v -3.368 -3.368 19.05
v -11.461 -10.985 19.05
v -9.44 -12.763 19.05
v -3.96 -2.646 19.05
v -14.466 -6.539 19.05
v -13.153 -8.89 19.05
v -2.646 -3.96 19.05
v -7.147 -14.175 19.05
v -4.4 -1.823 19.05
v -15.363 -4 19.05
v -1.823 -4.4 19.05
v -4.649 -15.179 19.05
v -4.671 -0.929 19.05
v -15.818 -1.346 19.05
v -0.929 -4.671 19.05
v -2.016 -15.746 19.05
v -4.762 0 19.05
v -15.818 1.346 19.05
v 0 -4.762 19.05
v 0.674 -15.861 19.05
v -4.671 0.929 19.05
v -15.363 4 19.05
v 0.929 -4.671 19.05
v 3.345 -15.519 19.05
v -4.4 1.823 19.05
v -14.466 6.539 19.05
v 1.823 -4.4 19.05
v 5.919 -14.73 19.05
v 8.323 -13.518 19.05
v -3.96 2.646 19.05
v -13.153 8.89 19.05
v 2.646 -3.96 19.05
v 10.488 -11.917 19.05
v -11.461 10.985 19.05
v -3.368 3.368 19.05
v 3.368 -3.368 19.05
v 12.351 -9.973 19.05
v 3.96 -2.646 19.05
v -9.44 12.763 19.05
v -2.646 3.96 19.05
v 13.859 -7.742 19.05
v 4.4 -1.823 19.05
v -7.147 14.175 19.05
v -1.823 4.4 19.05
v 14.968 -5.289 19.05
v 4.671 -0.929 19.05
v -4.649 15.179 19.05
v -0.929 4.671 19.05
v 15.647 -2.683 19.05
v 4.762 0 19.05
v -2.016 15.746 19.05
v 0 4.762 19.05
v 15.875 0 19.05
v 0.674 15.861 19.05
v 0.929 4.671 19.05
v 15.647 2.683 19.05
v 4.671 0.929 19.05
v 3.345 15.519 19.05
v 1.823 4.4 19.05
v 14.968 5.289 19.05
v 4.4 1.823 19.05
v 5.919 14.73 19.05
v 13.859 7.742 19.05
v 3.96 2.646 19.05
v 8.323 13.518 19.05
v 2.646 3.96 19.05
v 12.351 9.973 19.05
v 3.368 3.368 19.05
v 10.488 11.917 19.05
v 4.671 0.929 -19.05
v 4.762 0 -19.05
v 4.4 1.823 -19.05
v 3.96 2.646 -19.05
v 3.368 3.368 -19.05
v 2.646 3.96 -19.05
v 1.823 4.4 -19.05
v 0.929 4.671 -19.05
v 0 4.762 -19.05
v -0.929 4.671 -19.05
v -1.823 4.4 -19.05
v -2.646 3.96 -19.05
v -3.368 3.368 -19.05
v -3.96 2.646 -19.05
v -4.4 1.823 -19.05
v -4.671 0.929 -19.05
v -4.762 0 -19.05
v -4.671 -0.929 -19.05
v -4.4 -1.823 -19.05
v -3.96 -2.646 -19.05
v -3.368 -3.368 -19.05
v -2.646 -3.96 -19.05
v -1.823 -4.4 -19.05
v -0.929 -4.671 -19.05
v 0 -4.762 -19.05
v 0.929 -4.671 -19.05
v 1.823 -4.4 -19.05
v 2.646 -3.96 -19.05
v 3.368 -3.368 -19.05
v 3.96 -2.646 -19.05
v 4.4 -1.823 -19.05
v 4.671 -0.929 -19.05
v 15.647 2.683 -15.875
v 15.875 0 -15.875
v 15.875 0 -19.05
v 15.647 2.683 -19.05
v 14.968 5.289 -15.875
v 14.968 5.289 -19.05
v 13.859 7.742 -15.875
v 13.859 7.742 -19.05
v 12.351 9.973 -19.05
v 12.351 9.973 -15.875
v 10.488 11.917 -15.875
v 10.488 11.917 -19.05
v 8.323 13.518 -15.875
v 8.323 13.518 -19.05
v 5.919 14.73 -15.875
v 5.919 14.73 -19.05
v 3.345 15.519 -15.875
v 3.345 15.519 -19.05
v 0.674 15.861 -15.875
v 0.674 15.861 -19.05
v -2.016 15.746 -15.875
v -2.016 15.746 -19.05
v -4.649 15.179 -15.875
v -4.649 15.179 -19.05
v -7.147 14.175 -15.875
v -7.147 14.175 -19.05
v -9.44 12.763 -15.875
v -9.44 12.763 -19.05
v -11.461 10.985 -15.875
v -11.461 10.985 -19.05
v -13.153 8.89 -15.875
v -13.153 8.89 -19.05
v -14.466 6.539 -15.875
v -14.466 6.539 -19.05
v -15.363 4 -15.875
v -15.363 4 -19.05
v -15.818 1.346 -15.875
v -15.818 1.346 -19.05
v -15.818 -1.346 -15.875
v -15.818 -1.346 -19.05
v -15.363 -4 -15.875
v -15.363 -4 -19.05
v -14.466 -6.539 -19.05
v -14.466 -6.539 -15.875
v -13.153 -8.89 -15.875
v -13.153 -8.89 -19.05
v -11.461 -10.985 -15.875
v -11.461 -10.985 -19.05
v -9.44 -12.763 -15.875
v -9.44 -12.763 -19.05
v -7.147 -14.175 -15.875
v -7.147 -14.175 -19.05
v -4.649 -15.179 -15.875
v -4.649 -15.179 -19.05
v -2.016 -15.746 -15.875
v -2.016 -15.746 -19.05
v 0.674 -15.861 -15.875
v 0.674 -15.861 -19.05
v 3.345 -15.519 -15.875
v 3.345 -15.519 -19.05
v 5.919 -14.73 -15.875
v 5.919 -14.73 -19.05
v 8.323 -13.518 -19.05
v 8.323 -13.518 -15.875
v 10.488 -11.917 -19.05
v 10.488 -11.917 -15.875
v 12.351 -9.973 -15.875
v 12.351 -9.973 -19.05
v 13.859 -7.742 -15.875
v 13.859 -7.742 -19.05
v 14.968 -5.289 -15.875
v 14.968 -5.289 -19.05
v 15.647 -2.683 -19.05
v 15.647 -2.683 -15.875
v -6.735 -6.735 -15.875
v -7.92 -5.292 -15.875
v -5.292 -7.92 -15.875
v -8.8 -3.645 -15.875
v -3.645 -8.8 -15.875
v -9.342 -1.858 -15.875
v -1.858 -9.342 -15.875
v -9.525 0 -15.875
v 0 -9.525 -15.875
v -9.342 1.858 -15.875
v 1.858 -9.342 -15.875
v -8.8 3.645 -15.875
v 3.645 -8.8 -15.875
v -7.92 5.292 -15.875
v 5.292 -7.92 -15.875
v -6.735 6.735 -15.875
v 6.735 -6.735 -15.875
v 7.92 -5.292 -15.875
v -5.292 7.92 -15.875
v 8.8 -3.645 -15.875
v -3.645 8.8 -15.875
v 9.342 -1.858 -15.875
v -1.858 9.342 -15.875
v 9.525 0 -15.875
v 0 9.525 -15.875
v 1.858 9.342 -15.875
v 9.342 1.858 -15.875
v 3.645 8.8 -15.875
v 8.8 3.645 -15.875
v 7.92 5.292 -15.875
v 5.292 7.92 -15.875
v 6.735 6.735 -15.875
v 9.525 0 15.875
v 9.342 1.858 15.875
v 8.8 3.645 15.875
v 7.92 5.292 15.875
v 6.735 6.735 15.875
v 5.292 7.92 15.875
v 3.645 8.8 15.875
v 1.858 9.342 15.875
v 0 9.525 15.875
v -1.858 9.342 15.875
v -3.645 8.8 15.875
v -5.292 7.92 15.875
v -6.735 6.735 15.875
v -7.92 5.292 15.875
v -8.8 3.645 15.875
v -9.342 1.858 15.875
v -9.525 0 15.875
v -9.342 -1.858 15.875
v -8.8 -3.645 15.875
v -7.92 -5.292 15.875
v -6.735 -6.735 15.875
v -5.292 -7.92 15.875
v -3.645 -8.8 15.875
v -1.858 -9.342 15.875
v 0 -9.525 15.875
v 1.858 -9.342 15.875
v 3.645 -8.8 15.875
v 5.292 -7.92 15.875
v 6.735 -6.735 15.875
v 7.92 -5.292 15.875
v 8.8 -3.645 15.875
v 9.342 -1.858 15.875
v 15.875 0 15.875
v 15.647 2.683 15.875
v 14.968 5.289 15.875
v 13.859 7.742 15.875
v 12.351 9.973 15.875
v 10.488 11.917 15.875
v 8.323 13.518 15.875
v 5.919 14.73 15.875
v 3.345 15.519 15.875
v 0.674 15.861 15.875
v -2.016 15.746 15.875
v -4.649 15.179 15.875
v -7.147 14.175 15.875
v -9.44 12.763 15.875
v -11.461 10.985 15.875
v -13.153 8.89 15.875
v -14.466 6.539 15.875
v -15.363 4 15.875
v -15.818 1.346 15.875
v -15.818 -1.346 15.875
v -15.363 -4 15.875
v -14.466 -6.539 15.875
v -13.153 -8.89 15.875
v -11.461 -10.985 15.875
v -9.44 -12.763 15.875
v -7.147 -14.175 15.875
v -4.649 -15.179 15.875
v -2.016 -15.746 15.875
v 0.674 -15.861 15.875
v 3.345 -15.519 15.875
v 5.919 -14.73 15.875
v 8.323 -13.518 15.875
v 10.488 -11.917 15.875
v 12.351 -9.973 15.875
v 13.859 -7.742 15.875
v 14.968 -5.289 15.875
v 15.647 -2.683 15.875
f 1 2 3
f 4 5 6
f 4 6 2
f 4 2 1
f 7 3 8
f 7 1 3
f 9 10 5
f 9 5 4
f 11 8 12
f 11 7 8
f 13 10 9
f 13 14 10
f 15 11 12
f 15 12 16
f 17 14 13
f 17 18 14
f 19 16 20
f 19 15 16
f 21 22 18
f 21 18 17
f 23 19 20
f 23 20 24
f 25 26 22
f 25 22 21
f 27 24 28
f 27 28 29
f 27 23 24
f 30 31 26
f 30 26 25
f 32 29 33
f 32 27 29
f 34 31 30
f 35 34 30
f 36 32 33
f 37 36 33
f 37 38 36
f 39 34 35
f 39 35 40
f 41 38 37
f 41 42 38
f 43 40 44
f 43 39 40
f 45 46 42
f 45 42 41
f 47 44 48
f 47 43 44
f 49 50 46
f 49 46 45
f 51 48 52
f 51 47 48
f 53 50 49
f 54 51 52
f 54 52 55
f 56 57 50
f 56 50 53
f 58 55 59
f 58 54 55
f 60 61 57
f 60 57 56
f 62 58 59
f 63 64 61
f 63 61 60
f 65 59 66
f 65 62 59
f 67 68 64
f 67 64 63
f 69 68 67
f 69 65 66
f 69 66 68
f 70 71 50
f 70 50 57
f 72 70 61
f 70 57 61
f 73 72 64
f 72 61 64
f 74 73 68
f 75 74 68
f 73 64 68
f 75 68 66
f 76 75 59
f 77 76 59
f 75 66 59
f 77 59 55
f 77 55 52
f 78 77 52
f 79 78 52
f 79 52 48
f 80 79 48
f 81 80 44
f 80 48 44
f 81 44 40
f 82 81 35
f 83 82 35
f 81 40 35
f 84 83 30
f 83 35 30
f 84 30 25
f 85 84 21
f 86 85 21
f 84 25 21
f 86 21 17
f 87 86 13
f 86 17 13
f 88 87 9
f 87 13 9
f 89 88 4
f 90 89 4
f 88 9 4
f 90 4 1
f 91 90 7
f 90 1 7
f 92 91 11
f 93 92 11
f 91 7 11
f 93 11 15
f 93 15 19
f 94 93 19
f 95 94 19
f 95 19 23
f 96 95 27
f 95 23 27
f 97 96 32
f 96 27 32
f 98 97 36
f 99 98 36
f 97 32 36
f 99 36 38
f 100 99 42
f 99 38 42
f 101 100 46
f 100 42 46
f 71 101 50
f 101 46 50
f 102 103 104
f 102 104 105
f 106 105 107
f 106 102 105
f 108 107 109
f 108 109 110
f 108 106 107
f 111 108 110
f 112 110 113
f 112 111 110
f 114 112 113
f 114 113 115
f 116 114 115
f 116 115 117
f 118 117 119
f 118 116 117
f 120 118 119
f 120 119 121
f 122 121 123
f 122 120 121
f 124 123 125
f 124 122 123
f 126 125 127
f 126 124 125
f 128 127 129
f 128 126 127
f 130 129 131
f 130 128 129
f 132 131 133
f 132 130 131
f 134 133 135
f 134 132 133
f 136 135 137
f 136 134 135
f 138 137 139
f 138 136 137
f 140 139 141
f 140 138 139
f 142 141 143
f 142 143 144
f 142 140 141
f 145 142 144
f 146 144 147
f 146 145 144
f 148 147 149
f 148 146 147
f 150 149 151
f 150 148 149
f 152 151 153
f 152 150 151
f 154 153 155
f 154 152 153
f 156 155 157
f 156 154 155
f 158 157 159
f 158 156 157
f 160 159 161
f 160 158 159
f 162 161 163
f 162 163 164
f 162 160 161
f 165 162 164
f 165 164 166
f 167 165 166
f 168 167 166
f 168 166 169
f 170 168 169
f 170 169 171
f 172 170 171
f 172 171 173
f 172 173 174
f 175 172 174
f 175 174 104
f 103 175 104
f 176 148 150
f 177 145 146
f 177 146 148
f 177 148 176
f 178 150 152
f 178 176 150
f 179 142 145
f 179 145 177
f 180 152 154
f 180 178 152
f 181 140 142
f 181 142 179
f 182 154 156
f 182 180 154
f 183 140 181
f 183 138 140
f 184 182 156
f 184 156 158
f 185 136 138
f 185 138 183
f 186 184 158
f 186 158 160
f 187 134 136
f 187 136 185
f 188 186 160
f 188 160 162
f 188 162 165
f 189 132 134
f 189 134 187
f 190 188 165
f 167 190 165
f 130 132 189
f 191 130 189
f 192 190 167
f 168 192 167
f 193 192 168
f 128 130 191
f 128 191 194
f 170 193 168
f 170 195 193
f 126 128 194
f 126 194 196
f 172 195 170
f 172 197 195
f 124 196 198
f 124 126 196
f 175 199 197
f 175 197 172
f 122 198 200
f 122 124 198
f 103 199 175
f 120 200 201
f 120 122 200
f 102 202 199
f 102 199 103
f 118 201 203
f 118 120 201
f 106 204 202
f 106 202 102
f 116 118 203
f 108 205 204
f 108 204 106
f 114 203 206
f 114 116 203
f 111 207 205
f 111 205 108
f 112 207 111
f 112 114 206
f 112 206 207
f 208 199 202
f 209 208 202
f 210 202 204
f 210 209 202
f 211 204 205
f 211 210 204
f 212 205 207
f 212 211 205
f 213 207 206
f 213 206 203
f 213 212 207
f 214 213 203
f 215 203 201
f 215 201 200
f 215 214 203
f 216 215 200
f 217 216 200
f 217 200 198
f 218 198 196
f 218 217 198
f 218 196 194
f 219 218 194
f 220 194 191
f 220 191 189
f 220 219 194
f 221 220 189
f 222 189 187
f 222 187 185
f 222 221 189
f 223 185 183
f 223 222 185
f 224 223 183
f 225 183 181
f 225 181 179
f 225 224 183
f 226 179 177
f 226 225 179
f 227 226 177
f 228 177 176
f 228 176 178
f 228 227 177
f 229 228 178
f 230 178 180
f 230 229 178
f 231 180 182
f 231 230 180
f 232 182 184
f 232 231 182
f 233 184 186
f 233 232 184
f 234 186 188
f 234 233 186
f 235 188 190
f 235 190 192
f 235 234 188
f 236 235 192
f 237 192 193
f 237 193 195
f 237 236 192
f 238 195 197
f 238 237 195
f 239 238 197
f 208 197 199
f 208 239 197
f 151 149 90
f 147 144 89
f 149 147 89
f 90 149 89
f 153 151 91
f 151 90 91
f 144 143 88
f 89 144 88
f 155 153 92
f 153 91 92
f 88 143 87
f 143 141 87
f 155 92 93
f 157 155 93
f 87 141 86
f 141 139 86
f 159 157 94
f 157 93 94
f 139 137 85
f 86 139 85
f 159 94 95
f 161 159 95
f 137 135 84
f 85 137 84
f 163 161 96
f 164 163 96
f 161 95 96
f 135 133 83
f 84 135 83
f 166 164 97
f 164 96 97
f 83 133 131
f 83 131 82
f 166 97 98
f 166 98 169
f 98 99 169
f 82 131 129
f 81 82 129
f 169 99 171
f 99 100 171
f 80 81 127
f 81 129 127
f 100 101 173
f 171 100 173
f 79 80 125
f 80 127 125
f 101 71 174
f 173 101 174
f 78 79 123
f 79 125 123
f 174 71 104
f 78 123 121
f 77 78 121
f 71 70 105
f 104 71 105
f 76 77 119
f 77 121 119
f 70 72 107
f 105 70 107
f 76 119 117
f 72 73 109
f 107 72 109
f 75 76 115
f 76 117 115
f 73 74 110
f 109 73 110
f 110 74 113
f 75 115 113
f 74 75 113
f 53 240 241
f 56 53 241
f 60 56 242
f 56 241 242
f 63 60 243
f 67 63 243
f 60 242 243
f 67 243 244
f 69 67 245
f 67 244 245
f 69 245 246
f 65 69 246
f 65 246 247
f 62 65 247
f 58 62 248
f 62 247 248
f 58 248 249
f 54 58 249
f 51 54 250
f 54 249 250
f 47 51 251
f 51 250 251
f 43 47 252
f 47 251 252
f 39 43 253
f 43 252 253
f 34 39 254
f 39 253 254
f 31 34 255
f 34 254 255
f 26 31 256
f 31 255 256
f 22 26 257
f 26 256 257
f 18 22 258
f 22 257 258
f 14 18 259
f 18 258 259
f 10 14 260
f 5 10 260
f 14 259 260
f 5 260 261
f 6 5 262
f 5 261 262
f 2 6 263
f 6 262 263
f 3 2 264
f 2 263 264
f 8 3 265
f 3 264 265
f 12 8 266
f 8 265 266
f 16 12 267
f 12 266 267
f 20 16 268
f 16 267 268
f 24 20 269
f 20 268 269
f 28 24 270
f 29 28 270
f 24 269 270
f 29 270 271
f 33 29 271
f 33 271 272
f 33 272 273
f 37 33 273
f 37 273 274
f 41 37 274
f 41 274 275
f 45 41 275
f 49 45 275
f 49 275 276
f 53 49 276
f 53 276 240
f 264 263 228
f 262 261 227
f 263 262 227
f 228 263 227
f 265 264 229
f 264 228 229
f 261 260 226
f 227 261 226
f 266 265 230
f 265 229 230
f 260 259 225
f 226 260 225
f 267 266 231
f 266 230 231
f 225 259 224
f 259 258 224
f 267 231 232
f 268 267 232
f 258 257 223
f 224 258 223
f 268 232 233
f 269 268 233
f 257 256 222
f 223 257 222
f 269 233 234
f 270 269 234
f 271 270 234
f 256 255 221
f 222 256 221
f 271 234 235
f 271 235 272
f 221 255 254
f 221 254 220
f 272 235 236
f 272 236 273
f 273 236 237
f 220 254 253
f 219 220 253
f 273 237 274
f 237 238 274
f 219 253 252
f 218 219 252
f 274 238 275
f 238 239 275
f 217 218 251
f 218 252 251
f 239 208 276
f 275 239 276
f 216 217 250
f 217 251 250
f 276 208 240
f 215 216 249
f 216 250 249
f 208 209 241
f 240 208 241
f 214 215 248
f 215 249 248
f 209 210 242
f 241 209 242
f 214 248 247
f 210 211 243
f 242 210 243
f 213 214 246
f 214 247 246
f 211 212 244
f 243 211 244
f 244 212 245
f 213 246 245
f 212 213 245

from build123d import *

# Parameters (mm, degrees)
SKETCH1_R           = 9.525
SKETCH1_R_2         = 4.7625
BOSS_EXTRUDE1_DEPTH = 15.875
BOSS_EXTRUDE2_START = 15.875
SKETCH1_3_R         = 15.875
SKETCH1_3_R_2       = 4.7625
BOSS_EXTRUDE2_DEPTH = 3.175


with BuildPart() as part:
    # Sketch1 → Boss-Extrude1 (new body)
    with BuildSketch(Plane.XY):
        Circle(SKETCH1_R)
        Circle(SKETCH1_R_2, mode=Mode.SUBTRACT)
    extrude(amount=BOSS_EXTRUDE1_DEPTH)

    # Sketch1<3> → Boss-Extrude2 (add)
    with BuildSketch(Plane.XY.offset(BOSS_EXTRUDE2_START)):
        Circle(SKETCH1_3_R)
        Circle(SKETCH1_3_R_2, mode=Mode.SUBTRACT)
    extrude(amount=BOSS_EXTRUDE2_DEPTH)

    # Mirror1: part across plane


with BuildPart() as part_1:
    add(part.part)
    add(part.part.mirror(Plane.XY))


solid = part_1.part
